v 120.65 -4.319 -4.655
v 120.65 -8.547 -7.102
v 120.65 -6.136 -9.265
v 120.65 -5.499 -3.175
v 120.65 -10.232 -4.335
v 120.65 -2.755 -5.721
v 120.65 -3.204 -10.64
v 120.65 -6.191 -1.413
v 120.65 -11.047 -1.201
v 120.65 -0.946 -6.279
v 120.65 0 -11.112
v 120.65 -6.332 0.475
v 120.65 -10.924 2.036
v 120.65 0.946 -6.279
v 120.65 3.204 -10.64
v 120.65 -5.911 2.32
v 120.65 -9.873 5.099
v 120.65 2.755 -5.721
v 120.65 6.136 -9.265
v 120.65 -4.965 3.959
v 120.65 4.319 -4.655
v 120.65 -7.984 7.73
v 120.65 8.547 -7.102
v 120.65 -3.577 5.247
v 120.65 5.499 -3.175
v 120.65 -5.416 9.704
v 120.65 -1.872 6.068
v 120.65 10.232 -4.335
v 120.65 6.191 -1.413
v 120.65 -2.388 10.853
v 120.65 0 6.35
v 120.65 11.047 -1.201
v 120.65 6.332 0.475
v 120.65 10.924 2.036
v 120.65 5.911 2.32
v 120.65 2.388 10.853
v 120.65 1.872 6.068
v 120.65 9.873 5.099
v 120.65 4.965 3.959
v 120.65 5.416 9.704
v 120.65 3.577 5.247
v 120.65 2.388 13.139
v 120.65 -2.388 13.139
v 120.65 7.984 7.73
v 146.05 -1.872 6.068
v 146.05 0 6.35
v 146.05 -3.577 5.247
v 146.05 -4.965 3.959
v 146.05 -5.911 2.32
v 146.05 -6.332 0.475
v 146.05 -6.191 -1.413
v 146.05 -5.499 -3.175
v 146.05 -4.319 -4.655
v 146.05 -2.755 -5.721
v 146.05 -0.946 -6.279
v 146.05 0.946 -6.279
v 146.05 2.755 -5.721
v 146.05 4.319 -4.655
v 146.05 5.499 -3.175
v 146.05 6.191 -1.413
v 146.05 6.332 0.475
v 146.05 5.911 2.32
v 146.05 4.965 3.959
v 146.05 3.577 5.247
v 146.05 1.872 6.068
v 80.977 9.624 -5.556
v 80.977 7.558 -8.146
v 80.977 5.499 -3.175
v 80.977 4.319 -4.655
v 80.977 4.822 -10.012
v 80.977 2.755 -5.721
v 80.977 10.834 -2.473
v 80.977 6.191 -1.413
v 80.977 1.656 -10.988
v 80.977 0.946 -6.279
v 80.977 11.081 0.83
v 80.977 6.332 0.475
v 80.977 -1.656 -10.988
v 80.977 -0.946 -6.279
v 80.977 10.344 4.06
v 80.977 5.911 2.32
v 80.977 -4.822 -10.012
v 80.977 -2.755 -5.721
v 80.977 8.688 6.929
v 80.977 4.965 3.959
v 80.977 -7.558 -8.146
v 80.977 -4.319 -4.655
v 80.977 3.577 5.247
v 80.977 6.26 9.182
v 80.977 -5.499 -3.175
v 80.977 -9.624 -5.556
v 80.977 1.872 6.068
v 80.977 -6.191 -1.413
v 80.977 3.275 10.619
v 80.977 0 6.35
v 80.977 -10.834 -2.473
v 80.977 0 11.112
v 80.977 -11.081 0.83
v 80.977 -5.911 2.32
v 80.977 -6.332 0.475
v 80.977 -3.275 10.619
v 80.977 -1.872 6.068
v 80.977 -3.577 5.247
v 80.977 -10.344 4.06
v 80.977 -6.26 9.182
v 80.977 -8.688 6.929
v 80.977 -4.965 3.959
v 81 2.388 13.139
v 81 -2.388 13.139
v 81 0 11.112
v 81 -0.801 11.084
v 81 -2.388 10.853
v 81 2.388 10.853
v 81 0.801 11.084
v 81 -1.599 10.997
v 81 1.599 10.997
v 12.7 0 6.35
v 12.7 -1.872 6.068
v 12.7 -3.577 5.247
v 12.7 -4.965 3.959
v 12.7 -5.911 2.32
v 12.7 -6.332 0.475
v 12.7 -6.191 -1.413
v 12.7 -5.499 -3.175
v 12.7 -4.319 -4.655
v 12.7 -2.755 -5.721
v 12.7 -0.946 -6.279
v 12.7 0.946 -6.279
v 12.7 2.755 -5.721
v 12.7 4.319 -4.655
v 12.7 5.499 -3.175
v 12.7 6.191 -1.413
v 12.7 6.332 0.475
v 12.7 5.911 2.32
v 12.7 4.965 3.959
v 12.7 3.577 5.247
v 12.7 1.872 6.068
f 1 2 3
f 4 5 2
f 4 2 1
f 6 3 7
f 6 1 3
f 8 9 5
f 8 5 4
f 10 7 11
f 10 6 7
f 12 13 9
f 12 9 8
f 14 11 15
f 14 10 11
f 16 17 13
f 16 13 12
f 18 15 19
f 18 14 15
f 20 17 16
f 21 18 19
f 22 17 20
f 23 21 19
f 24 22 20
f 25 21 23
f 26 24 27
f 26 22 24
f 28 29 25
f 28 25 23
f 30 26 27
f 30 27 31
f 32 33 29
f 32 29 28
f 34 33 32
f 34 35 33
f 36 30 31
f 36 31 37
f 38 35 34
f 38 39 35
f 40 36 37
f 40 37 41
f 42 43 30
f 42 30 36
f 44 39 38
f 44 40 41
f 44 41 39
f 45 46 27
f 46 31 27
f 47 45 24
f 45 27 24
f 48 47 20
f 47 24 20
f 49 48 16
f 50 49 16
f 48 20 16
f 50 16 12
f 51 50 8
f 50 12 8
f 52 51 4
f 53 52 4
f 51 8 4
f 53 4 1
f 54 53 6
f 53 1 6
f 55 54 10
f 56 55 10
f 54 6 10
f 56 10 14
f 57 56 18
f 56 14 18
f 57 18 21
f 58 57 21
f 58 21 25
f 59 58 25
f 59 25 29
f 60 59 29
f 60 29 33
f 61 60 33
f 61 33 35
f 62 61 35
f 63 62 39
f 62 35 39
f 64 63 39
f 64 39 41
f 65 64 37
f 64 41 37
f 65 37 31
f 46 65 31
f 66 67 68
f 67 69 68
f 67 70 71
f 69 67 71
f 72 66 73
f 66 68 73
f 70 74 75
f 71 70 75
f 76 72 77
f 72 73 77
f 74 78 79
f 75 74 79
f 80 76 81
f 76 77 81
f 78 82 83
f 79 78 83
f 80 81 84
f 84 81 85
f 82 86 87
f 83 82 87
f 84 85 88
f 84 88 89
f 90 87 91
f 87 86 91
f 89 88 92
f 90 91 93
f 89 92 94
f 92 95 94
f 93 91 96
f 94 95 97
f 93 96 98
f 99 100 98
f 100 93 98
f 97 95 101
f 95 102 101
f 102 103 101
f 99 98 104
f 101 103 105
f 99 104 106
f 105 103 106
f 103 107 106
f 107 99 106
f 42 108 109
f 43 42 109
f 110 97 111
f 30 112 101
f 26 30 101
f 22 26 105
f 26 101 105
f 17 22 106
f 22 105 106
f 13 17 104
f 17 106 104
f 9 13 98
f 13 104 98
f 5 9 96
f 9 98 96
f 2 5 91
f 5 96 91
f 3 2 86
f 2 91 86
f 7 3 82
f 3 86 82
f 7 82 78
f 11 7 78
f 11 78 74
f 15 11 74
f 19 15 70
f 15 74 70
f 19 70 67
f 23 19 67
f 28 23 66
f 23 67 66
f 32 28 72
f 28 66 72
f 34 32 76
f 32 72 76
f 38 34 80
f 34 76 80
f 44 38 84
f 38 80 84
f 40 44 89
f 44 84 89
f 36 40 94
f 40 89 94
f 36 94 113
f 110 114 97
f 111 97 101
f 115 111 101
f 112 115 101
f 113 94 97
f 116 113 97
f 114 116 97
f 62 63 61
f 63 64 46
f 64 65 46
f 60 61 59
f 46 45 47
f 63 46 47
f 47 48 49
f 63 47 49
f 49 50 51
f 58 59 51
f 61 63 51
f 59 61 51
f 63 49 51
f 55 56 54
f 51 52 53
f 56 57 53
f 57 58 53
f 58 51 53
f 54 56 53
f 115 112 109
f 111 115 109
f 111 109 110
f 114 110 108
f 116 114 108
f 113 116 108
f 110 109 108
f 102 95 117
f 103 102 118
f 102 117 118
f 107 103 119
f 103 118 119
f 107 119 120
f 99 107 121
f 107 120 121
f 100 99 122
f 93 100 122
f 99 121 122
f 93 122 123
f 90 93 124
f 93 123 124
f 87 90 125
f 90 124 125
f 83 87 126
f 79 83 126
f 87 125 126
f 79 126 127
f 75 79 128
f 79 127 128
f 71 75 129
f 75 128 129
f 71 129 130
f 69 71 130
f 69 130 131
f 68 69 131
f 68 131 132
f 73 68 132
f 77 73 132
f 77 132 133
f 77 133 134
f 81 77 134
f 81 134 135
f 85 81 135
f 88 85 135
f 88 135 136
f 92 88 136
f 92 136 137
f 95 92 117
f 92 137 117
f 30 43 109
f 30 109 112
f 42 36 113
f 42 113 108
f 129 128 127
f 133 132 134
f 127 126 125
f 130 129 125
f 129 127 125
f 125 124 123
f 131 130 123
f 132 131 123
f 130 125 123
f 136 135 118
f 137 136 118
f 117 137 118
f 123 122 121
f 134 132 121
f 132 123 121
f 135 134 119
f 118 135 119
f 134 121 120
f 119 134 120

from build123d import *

# Parameters (mm, degrees)
F3_DEPTH = 39.65
F4_DEPTH = 12.7
F5_DEPTH = 12.7


with BuildPart() as f1:
    # F0 (on Front) → F1 (revolve)
    with BuildSketch(Plane.XZ):
        Polygon((0, 6.35), (0, 0), (133.35, 0), (133.35, 6.35), (120.65, 6.35), (120.65, 11.1125), (80.9773877263, 11.1125), (80.9773877263, 6.35), align=None)
    revolve(axis=Axis((66.675, 0, 0), (1, 0, 0)))

    # F2 (on face) → F3 (join)
    with BuildSketch(Plane.YZ.offset(120.65)):
        with BuildLine():
            Line((-2.3876, 13.1389729793), (-2.3876, 10.8529729793))
            ThreePointArc((-2.3876, 10.8529729793), (0, 11.1125), (2.3876, 10.8529729793))
            Line((2.3876, 10.8529729793), (2.3876, 13.1389729793))
            Line((2.3876, 13.1389729793), (-2.3876, 13.1389729793))
        make_face()
    extrude(amount=-F3_DEPTH)

    # F4 (add): a face of the model
    f4_faces = [f1.faces().sort_by_distance(p)[0] for p in [
        (133.35, 0, 0),
    ]]
    extrude(f4_faces, amount=F4_DEPTH)

    # F5 (cut): a face of the model
    f5_faces = [f1.faces().sort_by_distance(p)[0] for p in [
        (0, 0, 0),
    ]]
    extrude(f5_faces, amount=-F5_DEPTH, mode=Mode.SUBTRACT)


solid = f1.part
